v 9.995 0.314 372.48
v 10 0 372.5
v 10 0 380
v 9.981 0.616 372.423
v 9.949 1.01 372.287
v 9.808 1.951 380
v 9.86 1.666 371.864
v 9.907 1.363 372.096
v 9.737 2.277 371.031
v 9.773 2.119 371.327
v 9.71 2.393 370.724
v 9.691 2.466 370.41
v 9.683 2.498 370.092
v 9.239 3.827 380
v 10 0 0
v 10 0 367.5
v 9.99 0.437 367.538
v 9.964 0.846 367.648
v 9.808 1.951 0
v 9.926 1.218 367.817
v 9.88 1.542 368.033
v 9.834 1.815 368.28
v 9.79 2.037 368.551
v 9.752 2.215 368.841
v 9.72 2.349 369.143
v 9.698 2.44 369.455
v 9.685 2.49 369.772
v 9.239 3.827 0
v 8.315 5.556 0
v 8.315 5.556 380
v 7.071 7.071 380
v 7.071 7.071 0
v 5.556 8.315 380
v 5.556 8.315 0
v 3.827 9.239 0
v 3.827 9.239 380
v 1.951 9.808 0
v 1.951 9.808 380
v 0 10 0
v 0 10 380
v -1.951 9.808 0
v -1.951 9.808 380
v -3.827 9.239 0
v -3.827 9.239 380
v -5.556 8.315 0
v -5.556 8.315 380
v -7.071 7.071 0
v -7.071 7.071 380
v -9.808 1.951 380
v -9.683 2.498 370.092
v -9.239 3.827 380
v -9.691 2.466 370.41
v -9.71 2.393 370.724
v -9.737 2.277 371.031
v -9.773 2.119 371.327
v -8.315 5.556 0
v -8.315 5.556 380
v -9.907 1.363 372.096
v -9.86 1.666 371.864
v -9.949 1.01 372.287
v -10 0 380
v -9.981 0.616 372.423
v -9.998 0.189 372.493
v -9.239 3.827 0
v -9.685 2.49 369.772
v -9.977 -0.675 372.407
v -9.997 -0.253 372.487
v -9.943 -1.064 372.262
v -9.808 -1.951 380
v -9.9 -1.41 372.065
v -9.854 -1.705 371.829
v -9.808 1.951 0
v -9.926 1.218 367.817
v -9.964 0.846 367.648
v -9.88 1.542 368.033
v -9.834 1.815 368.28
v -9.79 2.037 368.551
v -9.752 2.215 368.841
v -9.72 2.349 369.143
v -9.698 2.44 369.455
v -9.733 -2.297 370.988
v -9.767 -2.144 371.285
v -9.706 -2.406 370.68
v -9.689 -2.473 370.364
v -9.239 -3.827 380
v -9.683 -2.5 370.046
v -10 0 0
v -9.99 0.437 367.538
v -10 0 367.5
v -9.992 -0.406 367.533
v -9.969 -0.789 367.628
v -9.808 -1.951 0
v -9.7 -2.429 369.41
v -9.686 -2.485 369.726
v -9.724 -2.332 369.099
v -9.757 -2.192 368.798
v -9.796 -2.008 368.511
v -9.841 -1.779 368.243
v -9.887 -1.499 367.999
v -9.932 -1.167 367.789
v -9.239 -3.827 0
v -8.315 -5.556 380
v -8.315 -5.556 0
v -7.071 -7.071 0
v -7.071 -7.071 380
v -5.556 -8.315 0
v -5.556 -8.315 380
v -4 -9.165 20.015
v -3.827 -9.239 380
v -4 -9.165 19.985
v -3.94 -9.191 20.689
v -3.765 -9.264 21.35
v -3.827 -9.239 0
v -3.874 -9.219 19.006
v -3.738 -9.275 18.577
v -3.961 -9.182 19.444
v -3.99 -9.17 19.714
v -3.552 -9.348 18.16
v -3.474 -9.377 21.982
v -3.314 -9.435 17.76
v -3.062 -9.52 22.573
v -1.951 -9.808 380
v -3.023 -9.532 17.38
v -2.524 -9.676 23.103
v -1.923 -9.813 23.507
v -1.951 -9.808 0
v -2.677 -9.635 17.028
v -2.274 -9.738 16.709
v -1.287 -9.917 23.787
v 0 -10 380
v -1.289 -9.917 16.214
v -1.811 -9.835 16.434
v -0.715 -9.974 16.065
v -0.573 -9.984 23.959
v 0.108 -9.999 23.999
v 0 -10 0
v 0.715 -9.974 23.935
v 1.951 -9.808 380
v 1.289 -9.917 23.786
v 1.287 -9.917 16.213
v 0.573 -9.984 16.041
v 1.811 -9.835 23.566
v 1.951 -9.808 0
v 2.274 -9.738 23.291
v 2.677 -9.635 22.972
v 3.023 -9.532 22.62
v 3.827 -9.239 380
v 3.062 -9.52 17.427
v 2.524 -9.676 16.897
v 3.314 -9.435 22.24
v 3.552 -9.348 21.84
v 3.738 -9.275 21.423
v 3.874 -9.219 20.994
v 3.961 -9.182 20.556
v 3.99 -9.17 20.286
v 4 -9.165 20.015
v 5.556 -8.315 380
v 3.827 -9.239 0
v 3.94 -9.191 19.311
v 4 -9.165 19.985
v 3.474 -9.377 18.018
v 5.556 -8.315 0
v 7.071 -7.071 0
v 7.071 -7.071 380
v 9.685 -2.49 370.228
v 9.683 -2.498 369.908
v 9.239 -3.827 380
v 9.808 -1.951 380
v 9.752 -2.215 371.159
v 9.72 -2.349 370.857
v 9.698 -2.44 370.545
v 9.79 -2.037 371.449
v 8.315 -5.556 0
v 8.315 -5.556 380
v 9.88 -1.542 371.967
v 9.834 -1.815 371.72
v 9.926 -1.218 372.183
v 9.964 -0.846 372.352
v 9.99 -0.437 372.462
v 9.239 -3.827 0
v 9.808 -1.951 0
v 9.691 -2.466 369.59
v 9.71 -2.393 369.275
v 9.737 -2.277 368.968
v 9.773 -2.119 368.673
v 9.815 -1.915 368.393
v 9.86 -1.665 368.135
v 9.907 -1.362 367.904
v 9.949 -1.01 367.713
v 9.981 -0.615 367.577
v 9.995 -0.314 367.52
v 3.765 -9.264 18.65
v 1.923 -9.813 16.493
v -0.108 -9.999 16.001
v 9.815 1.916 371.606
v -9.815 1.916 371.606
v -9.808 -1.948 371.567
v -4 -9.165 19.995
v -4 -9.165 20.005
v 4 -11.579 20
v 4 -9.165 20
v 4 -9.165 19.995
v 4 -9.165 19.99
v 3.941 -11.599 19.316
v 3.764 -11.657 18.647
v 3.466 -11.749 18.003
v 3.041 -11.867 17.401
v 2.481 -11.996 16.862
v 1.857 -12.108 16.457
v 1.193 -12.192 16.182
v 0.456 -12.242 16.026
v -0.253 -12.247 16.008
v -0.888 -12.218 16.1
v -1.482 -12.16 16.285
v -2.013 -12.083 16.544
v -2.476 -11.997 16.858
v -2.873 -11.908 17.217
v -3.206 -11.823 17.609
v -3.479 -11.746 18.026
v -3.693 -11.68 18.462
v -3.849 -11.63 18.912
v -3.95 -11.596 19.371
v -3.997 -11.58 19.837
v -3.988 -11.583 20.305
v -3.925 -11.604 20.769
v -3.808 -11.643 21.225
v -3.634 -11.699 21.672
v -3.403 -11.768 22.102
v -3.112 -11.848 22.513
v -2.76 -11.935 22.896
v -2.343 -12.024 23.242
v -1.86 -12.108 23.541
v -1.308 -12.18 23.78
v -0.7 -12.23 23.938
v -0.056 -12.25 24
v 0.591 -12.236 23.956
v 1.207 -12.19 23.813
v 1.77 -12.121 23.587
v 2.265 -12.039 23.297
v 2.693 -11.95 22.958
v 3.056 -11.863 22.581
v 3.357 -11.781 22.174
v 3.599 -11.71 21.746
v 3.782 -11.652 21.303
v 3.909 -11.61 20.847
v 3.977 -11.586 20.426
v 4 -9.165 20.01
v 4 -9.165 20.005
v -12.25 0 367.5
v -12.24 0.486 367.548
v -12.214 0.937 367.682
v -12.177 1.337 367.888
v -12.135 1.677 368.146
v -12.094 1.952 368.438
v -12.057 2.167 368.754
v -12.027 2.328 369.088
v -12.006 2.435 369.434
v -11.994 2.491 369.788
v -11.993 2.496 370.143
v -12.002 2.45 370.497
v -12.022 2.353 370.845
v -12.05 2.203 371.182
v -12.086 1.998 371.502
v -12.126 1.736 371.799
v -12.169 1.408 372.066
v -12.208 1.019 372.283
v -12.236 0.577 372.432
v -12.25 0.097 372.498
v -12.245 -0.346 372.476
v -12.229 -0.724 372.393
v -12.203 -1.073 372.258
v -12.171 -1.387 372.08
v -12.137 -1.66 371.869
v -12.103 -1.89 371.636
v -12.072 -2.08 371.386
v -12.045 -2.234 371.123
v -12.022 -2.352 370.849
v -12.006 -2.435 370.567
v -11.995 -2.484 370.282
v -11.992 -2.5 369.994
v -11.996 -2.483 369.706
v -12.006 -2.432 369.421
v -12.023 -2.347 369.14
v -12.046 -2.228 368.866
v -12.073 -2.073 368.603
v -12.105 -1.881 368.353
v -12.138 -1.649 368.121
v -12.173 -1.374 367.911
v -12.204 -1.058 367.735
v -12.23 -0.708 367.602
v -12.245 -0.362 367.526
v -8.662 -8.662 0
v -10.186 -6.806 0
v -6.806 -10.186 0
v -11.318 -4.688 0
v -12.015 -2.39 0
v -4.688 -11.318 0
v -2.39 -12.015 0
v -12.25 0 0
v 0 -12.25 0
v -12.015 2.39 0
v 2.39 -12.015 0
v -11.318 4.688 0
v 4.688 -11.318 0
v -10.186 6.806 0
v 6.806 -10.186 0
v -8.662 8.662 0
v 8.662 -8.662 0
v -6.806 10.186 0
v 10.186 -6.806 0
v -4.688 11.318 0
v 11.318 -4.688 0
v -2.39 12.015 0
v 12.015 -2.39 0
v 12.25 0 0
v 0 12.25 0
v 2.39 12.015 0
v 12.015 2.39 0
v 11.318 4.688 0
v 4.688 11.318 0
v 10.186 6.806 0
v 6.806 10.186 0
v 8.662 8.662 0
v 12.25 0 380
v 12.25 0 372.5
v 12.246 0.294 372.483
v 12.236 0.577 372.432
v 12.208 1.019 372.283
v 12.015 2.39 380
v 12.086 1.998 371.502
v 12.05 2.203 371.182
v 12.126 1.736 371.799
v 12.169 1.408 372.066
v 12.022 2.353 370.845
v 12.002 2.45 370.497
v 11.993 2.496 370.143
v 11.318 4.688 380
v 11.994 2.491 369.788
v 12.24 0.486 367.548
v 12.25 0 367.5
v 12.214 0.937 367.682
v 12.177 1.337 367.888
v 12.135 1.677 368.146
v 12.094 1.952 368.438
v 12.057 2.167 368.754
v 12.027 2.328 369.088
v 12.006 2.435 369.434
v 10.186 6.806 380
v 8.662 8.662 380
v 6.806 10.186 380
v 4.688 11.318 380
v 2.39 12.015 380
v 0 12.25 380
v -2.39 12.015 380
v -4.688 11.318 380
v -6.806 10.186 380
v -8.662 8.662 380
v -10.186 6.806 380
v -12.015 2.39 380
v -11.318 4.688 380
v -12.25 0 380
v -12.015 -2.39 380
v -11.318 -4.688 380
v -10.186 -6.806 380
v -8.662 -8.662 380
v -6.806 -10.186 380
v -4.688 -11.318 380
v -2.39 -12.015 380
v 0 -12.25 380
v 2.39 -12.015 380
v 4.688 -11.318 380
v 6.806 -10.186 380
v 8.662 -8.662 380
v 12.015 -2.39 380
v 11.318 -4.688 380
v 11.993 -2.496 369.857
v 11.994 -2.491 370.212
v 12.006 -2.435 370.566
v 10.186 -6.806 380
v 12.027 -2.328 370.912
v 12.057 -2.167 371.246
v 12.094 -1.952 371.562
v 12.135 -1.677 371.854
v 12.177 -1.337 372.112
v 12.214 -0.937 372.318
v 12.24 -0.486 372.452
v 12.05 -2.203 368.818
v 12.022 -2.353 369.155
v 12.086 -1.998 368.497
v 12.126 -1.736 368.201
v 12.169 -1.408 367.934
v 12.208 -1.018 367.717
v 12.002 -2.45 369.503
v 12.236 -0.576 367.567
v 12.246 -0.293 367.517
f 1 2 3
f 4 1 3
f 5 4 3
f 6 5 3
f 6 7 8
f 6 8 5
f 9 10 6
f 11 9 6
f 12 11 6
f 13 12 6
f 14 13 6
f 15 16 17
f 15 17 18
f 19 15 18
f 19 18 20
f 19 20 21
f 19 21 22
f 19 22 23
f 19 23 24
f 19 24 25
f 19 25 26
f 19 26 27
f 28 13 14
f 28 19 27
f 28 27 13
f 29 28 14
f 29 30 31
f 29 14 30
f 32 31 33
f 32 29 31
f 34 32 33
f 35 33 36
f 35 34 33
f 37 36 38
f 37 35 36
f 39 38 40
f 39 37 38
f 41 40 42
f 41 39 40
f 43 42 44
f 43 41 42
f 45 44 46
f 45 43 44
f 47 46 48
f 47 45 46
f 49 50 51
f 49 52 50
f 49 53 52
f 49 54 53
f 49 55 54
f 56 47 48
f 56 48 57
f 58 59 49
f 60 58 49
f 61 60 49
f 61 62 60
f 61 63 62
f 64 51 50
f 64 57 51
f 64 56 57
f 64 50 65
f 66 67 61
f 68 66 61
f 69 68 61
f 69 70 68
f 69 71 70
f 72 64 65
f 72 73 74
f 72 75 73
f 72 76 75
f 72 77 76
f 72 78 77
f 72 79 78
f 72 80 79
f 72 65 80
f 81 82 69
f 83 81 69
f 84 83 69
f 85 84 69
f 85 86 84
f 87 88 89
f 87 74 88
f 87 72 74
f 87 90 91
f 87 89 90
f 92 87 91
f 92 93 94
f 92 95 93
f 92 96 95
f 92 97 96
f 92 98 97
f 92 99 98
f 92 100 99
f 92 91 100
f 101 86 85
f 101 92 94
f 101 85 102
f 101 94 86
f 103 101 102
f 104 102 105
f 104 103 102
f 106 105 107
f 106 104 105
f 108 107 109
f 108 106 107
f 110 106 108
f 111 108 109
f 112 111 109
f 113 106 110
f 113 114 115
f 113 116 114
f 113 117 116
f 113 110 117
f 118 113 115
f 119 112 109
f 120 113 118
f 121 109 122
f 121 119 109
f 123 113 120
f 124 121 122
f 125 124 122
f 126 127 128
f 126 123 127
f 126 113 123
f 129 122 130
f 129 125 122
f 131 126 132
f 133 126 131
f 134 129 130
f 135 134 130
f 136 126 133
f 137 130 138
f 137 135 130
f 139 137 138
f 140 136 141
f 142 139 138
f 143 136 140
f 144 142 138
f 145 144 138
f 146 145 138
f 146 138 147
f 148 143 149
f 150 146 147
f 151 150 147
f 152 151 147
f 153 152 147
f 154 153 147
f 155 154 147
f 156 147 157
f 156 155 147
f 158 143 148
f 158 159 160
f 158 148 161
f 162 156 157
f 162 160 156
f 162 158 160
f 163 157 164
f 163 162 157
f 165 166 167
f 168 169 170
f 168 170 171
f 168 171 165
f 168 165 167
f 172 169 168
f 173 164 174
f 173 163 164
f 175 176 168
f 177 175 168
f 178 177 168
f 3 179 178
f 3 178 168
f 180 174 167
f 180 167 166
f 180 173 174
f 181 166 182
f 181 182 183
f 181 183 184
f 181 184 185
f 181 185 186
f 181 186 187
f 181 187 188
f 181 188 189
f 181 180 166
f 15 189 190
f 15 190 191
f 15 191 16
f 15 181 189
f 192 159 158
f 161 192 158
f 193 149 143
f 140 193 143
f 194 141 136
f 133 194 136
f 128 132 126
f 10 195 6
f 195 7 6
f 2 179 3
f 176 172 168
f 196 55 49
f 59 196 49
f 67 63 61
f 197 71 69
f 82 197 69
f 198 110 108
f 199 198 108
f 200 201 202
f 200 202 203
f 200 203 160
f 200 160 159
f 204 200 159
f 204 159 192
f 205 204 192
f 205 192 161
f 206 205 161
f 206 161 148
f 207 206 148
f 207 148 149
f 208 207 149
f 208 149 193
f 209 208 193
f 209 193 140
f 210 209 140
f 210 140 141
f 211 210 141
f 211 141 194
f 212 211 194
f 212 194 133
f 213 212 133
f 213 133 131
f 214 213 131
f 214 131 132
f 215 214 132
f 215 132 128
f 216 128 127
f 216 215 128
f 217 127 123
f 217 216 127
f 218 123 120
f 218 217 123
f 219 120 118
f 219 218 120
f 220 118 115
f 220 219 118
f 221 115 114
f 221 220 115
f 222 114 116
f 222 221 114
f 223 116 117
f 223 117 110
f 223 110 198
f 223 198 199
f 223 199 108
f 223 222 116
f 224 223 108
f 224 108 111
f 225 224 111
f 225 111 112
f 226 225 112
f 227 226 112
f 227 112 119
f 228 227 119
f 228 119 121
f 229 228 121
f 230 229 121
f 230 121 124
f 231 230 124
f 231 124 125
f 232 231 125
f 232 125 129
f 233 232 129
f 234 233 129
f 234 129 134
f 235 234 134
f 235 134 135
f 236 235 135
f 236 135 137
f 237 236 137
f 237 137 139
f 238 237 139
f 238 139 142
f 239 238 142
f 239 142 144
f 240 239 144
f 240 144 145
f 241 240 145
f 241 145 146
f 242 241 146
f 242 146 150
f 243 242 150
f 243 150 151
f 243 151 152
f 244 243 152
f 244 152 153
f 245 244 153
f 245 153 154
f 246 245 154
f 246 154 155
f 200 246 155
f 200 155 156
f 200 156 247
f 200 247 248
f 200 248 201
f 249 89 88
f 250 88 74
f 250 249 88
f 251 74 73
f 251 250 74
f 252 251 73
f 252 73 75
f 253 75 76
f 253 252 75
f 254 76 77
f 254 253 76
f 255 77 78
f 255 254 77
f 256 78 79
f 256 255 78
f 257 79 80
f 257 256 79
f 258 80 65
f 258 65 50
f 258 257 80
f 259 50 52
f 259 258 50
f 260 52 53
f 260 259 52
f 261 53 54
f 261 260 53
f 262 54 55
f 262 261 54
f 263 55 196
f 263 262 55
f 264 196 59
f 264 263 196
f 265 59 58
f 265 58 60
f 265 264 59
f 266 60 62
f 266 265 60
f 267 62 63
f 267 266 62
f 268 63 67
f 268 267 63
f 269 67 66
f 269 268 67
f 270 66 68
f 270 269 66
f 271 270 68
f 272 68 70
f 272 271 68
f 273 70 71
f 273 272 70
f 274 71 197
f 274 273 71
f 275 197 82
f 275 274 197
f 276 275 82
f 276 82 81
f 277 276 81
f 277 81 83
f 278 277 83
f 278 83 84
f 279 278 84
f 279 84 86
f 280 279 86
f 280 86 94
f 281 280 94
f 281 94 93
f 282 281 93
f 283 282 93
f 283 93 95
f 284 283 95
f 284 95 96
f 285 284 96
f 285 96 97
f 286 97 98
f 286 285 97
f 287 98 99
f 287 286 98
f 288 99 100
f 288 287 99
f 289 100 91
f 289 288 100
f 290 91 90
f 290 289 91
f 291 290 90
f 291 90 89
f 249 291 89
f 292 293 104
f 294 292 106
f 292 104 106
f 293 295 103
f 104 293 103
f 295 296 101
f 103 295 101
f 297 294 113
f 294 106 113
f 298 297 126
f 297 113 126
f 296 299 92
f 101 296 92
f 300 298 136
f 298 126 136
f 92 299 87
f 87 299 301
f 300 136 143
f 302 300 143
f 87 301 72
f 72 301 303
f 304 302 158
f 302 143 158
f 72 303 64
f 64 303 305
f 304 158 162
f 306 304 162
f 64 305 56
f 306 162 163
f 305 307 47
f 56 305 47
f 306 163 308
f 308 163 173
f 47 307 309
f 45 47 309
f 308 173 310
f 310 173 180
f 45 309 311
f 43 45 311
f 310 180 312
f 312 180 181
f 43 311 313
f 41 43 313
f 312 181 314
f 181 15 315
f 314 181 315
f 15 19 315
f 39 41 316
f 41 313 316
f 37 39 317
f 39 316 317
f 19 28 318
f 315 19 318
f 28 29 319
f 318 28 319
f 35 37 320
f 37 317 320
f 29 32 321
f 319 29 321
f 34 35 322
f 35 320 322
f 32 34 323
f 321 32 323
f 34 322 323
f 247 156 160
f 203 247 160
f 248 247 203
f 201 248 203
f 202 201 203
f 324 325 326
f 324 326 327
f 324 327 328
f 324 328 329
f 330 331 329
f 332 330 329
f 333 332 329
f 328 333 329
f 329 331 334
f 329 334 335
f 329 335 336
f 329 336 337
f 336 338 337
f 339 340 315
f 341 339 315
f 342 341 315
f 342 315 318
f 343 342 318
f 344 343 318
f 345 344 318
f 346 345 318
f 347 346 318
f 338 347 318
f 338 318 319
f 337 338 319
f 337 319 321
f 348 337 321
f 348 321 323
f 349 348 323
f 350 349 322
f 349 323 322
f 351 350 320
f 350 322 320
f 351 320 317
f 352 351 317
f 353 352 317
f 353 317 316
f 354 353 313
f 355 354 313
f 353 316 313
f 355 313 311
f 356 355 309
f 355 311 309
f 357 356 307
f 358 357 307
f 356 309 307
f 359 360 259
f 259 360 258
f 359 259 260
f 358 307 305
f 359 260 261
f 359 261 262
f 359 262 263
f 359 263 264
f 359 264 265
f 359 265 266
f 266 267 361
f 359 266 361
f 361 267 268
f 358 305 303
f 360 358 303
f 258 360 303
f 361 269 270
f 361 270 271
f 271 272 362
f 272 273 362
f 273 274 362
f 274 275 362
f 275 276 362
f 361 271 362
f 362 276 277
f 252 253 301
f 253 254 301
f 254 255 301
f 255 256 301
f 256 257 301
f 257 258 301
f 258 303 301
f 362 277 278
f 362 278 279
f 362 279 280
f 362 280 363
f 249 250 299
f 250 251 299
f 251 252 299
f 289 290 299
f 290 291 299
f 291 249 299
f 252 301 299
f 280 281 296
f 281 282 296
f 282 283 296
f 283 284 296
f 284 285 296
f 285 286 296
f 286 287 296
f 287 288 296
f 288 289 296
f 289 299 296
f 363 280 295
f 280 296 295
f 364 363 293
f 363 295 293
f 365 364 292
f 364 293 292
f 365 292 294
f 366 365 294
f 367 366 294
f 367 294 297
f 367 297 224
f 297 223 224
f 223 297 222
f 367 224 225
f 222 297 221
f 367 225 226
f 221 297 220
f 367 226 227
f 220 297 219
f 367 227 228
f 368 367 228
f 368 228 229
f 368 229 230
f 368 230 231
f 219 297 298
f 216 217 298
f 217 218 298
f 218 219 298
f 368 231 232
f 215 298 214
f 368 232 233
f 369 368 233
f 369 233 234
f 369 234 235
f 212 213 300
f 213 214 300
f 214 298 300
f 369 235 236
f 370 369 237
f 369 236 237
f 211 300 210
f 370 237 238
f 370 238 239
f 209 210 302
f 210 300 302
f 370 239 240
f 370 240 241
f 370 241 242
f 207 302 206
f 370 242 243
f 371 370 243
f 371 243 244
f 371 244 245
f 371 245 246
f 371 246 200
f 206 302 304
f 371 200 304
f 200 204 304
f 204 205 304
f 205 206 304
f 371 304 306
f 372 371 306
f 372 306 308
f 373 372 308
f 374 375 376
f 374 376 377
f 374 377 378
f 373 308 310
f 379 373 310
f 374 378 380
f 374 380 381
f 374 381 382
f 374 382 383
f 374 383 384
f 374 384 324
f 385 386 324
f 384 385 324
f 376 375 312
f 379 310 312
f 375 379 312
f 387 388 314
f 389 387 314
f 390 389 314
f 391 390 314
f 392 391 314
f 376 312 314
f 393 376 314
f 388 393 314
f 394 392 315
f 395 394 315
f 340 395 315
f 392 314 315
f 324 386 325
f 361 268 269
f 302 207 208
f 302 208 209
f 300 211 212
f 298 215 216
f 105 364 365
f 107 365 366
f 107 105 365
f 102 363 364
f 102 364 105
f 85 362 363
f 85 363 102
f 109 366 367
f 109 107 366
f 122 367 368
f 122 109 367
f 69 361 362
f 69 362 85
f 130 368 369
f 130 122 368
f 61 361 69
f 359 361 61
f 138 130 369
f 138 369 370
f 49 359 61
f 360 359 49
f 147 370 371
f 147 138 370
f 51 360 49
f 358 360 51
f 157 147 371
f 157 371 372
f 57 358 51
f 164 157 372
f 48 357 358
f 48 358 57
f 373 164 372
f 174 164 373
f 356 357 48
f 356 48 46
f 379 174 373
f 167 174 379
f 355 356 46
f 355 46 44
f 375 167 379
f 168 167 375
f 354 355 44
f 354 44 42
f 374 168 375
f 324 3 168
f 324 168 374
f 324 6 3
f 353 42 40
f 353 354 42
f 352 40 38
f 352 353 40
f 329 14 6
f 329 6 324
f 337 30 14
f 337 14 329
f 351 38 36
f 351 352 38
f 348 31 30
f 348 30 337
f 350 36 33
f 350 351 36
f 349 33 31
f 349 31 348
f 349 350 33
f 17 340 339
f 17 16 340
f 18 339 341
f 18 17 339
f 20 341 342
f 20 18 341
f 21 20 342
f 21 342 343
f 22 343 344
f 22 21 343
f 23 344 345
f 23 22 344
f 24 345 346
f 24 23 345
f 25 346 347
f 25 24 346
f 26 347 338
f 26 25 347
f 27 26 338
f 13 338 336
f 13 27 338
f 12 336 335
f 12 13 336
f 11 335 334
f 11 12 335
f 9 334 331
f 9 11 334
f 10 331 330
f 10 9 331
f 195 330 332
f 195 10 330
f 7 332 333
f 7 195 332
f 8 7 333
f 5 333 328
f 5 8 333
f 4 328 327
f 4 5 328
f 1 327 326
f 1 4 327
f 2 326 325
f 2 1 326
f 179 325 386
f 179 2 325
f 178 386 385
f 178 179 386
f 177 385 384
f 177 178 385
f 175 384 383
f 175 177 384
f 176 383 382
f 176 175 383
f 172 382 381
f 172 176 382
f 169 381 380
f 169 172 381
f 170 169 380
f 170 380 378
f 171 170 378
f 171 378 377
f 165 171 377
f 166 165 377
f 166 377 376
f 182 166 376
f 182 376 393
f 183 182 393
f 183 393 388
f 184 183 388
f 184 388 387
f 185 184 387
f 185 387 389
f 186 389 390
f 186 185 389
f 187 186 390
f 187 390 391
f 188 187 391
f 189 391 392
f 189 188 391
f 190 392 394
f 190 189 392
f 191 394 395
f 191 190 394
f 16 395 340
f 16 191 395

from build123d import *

# Parameters (mm, degrees)
SKETCH1_R               = 12.25
BOSS_EXTRUDE1_DEPTH     = 380
CUT_EXTRUDE1_DEPTH      = 381.394696335
CUT_EXTRUDE1_DEPTH_BACK = 381.394696335
SKETCH2_R               = 2.5
CUT_EXTRUDE2_DEPTH      = 381.394696442
CUT_EXTRUDE2_DEPTH_BACK = 381.394696442
SKETCH3_R               = 10
CUT_EXTRUDE3_START      = -12.2500001
CUT_EXTRUDE3_OUTLINE_R  = 4
CUT_EXTRUDE3_DEPTH      = 3.08483721


# Read off the part's stored shape, not the designer's step: Cut-Extrude3
with BuildPart() as part:
    # Sketch1 → Boss-Extrude1 (new body)
    with BuildSketch(Plane.XY):
        Circle(SKETCH1_R)
    extrude(amount=BOSS_EXTRUDE1_DEPTH)

    # Sketch2 → Cut-Extrude1 (cut, two sides: drawn at the far end of the back side and taken through both)
    with BuildSketch(Plane(origin=(0, 0, 0), x_dir=(0, 0, -1), z_dir=(1, 0, 0)).offset(-CUT_EXTRUDE1_DEPTH_BACK)):
        with Locations((-370, 0)):
            Circle(SKETCH2_R)
    extrude(amount=CUT_EXTRUDE1_DEPTH + CUT_EXTRUDE1_DEPTH_BACK, mode=Mode.SUBTRACT)

    # Sketch3 → Cut-Extrude2 (cut, two sides: drawn at the far end of the back side and taken through both)
    with BuildSketch(Plane.XY.offset(380).offset(-CUT_EXTRUDE2_DEPTH_BACK)):
        Circle(SKETCH3_R)
    extrude(amount=CUT_EXTRUDE2_DEPTH + CUT_EXTRUDE2_DEPTH_BACK, mode=Mode.SUBTRACT)

    # Cut-Extrude3 outline → Cut-Extrude3 (cut)
    with BuildSketch(Plane(origin=(0, 0, 0), x_dir=(1, 0, 0), z_dir=(0, 1, 0)).offset(CUT_EXTRUDE3_START)):
        with Locations((0, -20)):
            Circle(CUT_EXTRUDE3_OUTLINE_R)
    extrude(amount=CUT_EXTRUDE3_DEPTH, mode=Mode.SUBTRACT)


solid = part.part
